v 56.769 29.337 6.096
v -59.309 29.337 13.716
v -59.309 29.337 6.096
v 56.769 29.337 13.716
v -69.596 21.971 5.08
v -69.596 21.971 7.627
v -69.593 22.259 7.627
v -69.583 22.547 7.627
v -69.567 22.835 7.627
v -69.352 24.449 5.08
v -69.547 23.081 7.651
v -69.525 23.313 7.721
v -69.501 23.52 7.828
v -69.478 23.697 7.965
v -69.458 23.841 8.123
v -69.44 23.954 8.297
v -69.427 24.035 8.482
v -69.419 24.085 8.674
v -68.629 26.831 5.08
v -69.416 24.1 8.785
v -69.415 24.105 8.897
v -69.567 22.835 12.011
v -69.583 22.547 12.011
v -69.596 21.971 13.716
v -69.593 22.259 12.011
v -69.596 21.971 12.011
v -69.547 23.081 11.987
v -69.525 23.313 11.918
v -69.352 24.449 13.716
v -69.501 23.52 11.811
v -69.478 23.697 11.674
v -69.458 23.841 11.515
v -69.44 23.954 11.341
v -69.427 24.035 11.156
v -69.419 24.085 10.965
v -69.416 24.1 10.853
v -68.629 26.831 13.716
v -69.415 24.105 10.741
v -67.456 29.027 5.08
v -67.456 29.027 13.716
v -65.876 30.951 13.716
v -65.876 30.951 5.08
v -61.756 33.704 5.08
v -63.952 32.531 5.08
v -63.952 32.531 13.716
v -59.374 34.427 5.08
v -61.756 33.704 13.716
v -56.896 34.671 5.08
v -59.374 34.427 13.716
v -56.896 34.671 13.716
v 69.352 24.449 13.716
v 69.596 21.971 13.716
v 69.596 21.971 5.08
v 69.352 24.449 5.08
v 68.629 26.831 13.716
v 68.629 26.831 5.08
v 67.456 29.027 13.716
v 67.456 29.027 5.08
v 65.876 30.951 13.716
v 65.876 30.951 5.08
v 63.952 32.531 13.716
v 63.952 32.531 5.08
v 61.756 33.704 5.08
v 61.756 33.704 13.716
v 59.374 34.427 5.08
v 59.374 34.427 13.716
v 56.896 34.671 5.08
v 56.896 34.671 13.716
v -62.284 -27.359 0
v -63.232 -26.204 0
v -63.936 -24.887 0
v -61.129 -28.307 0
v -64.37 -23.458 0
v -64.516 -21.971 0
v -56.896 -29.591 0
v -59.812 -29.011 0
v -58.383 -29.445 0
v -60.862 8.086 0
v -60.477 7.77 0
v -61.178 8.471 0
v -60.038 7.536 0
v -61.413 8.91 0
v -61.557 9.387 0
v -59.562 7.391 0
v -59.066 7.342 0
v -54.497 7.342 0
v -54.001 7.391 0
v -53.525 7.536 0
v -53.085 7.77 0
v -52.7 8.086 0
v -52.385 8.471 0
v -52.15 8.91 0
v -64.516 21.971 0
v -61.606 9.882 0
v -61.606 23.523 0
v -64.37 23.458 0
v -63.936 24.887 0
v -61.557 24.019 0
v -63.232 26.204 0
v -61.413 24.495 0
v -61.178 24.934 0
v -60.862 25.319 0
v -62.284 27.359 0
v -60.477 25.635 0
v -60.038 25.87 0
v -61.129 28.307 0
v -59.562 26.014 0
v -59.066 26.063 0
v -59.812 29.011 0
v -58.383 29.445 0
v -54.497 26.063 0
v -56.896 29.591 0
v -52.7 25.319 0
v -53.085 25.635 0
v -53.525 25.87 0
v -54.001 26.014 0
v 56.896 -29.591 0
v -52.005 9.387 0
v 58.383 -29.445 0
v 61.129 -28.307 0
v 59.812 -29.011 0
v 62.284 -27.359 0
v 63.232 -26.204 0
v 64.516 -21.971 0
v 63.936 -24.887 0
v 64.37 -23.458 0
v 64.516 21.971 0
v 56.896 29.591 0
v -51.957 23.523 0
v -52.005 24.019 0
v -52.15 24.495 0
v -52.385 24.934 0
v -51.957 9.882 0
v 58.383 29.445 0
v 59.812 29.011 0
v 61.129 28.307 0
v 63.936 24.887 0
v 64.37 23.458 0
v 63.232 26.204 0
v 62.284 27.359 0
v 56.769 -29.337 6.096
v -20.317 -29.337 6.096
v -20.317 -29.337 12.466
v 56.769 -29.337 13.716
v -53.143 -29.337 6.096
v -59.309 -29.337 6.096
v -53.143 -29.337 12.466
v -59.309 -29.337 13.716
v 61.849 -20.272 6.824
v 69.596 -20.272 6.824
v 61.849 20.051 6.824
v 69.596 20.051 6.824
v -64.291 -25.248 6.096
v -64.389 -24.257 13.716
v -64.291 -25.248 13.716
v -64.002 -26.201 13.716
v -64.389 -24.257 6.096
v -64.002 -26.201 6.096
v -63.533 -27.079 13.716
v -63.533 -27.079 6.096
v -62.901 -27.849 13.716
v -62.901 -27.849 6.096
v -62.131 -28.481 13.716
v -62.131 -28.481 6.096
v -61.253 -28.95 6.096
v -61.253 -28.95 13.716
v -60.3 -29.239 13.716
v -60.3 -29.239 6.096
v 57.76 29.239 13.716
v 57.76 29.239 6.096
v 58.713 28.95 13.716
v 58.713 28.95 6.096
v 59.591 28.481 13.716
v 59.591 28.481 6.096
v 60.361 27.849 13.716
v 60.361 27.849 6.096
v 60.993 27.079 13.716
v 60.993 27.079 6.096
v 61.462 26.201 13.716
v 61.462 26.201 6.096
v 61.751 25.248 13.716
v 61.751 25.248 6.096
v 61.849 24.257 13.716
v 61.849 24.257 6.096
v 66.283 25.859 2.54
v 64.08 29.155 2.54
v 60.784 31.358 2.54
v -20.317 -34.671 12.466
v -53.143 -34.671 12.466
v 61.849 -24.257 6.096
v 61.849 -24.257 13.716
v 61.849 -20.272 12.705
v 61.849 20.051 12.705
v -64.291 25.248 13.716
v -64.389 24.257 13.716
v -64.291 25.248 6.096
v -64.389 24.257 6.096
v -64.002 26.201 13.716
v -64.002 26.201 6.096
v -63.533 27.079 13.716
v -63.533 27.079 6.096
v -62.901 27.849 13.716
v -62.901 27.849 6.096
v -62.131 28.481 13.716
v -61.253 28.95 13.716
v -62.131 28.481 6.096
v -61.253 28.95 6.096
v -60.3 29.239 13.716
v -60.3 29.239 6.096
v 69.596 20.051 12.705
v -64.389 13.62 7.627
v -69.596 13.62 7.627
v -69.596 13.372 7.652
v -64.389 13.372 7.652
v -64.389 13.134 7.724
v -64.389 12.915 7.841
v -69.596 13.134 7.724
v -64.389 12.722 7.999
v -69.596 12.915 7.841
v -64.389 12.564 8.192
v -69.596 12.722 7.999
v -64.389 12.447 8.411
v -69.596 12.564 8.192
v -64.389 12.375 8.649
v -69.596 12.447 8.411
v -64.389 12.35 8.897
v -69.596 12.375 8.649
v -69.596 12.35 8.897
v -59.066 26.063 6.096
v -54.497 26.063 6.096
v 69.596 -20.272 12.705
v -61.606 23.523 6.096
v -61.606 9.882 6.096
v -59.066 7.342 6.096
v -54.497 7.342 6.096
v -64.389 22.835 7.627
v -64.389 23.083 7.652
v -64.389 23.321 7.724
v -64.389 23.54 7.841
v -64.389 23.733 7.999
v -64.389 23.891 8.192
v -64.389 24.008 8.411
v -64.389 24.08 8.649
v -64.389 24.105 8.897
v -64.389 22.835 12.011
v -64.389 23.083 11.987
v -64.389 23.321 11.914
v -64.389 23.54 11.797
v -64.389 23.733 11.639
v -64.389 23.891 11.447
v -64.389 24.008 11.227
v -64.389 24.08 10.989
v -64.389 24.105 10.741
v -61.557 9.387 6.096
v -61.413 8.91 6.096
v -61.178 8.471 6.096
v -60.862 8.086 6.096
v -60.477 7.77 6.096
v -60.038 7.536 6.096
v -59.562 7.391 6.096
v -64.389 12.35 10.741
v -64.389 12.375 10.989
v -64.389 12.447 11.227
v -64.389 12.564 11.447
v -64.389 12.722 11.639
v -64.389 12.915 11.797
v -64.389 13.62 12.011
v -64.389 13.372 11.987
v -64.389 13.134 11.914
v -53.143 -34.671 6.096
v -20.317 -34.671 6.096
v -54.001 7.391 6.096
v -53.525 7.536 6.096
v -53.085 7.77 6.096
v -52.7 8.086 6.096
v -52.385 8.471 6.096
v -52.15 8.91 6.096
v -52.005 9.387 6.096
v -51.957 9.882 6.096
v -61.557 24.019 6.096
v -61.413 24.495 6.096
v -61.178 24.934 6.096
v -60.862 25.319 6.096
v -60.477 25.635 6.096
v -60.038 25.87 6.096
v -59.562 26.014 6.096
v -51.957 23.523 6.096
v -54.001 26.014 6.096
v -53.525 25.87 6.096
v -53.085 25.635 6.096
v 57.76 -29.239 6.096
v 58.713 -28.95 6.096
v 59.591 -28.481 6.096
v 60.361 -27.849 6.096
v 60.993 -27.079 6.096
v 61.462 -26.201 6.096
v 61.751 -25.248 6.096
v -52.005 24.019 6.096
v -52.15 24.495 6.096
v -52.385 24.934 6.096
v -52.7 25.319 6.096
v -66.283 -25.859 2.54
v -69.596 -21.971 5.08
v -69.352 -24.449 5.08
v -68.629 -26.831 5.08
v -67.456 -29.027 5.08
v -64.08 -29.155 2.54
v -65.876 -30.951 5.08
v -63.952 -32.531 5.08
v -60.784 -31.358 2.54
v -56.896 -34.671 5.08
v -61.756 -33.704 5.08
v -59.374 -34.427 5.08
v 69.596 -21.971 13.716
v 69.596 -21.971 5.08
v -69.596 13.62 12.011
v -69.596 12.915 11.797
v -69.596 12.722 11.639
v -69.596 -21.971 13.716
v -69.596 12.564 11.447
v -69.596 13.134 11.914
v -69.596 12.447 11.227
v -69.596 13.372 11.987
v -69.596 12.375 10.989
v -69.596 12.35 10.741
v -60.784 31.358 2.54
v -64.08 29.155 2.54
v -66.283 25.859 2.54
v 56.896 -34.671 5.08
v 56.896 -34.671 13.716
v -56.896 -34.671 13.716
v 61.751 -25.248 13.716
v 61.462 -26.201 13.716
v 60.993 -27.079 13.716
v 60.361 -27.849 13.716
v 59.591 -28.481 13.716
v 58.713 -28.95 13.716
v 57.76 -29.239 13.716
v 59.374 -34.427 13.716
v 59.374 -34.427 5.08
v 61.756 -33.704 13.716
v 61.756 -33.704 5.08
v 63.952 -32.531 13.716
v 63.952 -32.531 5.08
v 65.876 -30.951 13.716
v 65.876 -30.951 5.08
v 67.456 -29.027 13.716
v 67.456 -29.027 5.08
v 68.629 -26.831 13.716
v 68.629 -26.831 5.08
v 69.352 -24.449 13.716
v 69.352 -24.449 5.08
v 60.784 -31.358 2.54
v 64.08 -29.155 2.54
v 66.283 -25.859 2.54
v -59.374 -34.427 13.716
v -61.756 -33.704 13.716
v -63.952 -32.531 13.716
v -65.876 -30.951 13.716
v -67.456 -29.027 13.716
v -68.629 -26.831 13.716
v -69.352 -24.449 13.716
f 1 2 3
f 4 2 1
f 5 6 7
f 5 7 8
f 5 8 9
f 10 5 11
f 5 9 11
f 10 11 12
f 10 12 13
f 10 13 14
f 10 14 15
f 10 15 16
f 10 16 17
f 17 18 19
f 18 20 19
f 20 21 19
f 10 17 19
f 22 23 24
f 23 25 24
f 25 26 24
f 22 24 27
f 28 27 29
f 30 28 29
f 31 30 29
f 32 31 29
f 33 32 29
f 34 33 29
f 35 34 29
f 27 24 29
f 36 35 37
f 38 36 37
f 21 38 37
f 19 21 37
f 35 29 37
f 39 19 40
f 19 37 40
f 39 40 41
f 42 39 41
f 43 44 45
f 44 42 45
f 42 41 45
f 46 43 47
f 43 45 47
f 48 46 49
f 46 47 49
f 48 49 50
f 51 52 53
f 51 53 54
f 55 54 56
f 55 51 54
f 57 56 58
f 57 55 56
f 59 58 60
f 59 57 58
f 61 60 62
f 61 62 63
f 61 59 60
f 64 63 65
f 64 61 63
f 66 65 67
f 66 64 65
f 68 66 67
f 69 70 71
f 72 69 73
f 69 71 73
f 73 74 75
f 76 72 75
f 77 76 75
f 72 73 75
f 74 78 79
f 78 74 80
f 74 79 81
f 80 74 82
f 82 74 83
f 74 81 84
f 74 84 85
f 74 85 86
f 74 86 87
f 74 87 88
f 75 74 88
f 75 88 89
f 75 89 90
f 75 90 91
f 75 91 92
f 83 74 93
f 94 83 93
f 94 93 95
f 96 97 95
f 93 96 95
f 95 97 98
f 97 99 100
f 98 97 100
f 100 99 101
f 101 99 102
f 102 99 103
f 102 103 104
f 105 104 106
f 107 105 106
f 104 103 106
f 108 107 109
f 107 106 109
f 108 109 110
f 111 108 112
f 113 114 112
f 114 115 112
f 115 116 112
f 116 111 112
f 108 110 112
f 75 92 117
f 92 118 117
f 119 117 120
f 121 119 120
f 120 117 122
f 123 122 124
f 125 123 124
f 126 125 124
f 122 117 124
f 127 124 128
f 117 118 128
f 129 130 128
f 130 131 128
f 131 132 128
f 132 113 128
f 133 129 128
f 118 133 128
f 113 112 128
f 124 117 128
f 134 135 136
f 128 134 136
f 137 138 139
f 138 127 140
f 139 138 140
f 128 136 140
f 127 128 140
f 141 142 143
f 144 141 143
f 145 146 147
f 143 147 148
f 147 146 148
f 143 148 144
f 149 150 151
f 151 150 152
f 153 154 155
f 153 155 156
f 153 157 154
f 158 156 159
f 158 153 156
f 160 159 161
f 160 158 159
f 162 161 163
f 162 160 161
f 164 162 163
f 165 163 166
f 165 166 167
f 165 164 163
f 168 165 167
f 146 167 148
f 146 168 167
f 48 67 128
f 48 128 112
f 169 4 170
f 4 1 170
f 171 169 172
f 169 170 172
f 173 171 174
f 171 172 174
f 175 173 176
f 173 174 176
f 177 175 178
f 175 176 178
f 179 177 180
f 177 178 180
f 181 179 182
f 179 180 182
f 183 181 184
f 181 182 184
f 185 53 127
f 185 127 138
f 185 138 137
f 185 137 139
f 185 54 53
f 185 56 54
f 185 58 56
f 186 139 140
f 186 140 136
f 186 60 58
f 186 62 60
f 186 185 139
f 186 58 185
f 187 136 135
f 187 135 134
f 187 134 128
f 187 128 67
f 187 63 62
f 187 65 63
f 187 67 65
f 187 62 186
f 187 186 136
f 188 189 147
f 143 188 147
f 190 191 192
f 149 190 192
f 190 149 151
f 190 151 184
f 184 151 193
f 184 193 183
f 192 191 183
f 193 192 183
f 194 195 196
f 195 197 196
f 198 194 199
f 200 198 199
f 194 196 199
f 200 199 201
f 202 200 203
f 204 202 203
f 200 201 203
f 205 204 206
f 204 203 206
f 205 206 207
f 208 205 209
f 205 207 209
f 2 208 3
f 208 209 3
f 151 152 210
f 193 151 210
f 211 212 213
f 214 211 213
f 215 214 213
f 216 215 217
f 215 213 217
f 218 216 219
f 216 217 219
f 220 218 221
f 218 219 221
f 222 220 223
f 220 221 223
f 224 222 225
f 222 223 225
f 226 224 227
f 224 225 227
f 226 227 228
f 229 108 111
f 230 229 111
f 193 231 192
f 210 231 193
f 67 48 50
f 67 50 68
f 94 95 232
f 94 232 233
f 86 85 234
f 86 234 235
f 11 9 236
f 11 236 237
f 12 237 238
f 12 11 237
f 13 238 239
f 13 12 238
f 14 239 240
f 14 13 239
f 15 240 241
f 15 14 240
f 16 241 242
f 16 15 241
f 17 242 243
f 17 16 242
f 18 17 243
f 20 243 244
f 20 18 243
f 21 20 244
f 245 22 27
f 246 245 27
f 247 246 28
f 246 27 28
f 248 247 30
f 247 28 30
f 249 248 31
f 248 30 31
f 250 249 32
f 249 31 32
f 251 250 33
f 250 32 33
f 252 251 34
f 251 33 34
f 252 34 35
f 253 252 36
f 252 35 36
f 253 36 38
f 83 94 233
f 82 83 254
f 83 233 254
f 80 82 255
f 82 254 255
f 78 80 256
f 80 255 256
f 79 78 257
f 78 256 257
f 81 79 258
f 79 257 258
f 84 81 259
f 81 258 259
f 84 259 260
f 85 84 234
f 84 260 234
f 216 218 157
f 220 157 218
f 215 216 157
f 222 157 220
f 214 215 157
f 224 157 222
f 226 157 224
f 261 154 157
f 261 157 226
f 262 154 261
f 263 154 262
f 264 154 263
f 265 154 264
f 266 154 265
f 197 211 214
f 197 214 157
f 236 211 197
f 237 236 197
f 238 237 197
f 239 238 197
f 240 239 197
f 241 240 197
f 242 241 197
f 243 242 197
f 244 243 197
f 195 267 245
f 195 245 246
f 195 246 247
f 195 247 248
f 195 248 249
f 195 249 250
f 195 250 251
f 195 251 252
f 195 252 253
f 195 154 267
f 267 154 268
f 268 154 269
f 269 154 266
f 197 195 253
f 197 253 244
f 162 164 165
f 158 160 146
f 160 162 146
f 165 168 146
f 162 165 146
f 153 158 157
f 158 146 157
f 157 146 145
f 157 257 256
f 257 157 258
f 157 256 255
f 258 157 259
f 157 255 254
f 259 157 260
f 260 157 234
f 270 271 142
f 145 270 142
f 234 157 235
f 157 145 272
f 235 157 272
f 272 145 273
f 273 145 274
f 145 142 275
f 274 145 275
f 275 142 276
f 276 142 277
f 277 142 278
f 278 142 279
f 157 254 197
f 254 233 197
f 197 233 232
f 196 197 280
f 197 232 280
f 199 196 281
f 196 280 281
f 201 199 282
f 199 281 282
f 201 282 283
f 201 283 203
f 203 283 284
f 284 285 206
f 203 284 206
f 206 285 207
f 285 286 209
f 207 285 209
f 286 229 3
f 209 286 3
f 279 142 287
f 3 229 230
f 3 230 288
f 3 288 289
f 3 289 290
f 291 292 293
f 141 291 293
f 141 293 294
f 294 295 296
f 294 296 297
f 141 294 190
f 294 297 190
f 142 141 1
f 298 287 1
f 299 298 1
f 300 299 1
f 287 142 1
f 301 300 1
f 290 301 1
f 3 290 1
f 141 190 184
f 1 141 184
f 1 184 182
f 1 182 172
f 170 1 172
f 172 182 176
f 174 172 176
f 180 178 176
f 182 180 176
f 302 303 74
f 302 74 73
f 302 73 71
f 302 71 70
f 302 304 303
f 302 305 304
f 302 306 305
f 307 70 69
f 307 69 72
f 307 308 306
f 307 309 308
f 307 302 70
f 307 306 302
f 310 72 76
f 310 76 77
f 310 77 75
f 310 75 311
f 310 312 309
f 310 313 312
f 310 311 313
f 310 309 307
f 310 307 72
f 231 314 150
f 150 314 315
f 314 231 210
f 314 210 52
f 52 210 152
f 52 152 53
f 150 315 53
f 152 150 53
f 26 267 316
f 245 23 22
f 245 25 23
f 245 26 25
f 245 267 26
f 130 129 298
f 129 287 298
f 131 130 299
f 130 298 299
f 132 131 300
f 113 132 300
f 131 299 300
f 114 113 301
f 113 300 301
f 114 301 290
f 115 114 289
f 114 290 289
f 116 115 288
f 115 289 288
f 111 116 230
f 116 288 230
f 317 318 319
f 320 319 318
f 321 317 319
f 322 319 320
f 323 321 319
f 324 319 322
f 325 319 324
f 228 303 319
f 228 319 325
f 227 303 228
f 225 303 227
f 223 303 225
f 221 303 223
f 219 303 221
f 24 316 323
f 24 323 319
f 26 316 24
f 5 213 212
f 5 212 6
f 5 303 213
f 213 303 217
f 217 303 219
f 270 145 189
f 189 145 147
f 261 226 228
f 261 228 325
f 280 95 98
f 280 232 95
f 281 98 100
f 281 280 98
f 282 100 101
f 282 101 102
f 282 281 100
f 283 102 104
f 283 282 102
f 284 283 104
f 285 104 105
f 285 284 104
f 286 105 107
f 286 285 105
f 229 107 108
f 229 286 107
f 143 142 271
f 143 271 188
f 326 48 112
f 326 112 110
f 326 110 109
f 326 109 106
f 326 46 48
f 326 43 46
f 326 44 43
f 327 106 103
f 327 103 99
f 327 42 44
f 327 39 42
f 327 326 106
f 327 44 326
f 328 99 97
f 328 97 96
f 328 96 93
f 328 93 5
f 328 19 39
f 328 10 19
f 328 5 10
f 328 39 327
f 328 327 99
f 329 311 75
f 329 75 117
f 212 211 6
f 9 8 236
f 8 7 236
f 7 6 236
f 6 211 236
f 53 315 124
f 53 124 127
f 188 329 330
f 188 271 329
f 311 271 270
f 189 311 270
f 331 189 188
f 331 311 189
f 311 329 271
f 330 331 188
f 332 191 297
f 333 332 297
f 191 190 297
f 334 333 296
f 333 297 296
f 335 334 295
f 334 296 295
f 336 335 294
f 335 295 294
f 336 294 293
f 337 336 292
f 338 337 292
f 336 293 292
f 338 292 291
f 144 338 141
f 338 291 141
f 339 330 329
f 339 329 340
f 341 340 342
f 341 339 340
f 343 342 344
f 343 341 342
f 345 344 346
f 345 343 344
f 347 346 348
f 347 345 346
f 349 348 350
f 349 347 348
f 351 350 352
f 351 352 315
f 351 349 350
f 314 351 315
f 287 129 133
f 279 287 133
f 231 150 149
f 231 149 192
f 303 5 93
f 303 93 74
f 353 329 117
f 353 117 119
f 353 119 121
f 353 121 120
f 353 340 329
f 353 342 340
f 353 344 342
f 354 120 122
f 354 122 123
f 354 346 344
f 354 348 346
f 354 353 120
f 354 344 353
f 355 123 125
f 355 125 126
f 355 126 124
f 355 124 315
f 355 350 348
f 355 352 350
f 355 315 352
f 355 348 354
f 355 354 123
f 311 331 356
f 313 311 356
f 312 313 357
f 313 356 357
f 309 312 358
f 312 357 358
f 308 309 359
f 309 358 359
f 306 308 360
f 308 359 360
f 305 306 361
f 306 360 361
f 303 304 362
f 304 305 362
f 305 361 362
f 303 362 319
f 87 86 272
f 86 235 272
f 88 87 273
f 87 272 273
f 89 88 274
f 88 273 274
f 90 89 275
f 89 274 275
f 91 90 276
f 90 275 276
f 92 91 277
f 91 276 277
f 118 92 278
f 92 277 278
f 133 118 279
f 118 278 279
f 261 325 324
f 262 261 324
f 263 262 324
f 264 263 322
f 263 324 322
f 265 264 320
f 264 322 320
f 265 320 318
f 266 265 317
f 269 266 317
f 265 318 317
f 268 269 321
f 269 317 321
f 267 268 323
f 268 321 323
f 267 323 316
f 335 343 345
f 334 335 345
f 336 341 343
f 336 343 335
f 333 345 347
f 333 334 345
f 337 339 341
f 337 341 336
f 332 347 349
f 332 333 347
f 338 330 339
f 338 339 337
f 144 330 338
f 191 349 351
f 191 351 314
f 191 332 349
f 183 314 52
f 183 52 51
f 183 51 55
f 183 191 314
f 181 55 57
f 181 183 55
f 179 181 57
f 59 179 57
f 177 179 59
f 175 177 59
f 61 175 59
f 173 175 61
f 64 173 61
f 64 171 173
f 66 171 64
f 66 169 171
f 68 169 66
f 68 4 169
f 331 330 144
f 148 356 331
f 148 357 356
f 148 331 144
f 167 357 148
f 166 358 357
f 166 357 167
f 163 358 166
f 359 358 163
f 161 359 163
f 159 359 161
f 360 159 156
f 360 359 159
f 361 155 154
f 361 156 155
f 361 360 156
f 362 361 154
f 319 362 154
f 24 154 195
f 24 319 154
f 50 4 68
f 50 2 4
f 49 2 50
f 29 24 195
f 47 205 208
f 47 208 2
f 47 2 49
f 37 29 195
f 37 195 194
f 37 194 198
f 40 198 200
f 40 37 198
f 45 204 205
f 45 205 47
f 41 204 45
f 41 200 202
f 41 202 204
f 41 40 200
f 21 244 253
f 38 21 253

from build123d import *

# Parameters (mm, degrees)
F0_W      = 139.192
F0_H      = 69.342
F1_DEPTH  = 13.716
F2_W      = 123.698
F2_H      = 58.674
F3_DEPTH  = 7.62
F4_R      = 12.7
F5_R      = 12.7
F6_W      = 40.32391496
F6_H      = 5.8811781928
F7_DEPTH  = 25.4
F8_W      = 32.8259784728
F8_H      = 7.62
F9_DEPTH  = 25.4
F10_W     = 5.334
F10_H     = 1.2496084515
F11_DEPTH = 33.02
F12_W     = 9.6497610211
F12_H     = 18.7207064591
F13_DEPTH = 25.4
F14_R     = 2.54
F15_W     = 11.7547400296
F15_H     = 4.3837525882
F16_DEPTH = 25.4
F17_R     = 1.27
F18_SIZE  = 5.08
F19_DEPTH = 2.54
F20_R     = 5.08
F21_DEPTH = 1.778
F22_DEPTH = 1.778


with BuildPart() as f1:
    # F0 (on Top) → F1 (new body)
    with BuildSketch(Plane.XY):
        Rectangle(F0_W, F0_H)
    extrude(amount=F1_DEPTH)

    # F2 (on face) → F3 (cut)
    with BuildSketch(Plane.XY.offset(13.716)):
        Rectangle(F2_W, F2_H)
    extrude(amount=-F3_DEPTH, mode=Mode.SUBTRACT)

    # F4
    f4_edges = [f1.edges().sort_by_distance(p)[0] for p in [
        (69.596, -34.671, 6.858),
    ]]
    fillet(f4_edges, radius=F4_R)

    # F5
    f5_edges = [f1.edges().sort_by_distance(p)[0] for p in [
        (69.596, 34.671, 6.858),
        (-69.596, -34.671, 6.858),
        (-69.596, 34.671, 6.858),
    ]]
    fillet(f5_edges, radius=F5_R)

    # F6 (on face) → F7 (cut)
    with BuildSketch(Plane.YZ.offset(69.596)):
        with Locations((-0.1104911789, 9.7644287162)):
            Rectangle(F6_W, F6_H)
    extrude(amount=-F7_DEPTH, mode=Mode.SUBTRACT)

    # F8 (on face) → F9 (cut)
    with BuildSketch(Plane(origin=(0, -29.337, 0), x_dir=(-1, 0, 0), z_dir=(0, 1, 0))):
        with Locations((38.5076953098, 9.906)):
            Rectangle(F8_W, F8_H)
    extrude(amount=-F9_DEPTH, mode=Mode.SUBTRACT)

    # F10 (on face) → F11 (join)
    with BuildSketch(Plane.YZ.offset(-54.9206845462)):
        with Locations((-32.004, 13.0911957743)):
            Rectangle(F10_W, F10_H)
    extrude(amount=F11_DEPTH)

    # F12 (on face) → F13 (cut)
    with BuildSketch(Plane(origin=(0, 0, 0), x_dir=(1, 0, 0), z_dir=(0, 0, -1))):
        with Locations((-56.7813999951, -16.70263079)):
            Rectangle(F12_W, F12_H)
    extrude(amount=-F13_DEPTH, mode=Mode.SUBTRACT)

    # F14
    f14_edges = [f1.edges().sort_by_distance(p)[0] for p in [
        (-51.956519, 7.342278, 3.048),
        (-61.606281, 26.062984, 3.048),
        (-61.606281, 7.342278, 3.048),
        (-51.956519, 26.062984, 3.048),
    ]]
    fillet(f14_edges, radius=F14_R)

    # F15 (on face) → F16 (cut)
    with BuildSketch(Plane.YZ.offset(-61.849)):
        with Locations((18.2274878025, 9.8191385623)):
            Rectangle(F15_W, F15_H)
    extrude(amount=-F16_DEPTH, mode=Mode.SUBTRACT)

    # F17
    f17_edges = [f1.edges().sort_by_distance(p)[0] for p in [
        (-65.7225, 12.350118, 7.627262),
        (-65.7225, 12.350118, 12.011015),
        (-65.632225, 24.104858, 7.627262),
        (-65.632225, 24.104858, 12.011015),
    ]]
    fillet(f17_edges, radius=F17_R)

    # F18
    f18_edges = [f1.edges().sort_by_distance(p)[0] for p in [
        (0, -34.671, 0),
    ]]
    chamfer(f18_edges, length=F18_SIZE)

    # F19 (cut): a face of the model
    f19_faces = [f1.faces().sort_by_distance(p)[0] for p in [
        (-61.849, -2.3026136032, 9.916972896),
    ]]
    extrude(f19_faces, amount=-F19_DEPTH, mode=Mode.SUBTRACT)

    # F20
    f20_edges = [f1.edges().sort_by_distance(p)[0] for p in [
        (-64.389, -29.337, 9.906),
        (-64.389, 29.337, 9.906),
        (61.849, -29.337, 9.906),
        (61.849, 29.337, 9.906),
    ]]
    fillet(f20_edges, radius=F20_R)

    # F21 (add): a face of the model
    f21_faces = [f1.faces().sort_by_distance(p)[0] for p in [
        (-54.9206845462, -32.004, 9.2811957743),
    ]]
    extrude(f21_faces, amount=F21_DEPTH)

    # F22 (cut): a face of the model
    f22_faces = [f1.faces().sort_by_distance(p)[0] for p in [
        (-22.0947060734, -32.004, 9.2811957743),
    ]]
    extrude(f22_faces, amount=-F22_DEPTH, mode=Mode.SUBTRACT)


solid = f1.part
